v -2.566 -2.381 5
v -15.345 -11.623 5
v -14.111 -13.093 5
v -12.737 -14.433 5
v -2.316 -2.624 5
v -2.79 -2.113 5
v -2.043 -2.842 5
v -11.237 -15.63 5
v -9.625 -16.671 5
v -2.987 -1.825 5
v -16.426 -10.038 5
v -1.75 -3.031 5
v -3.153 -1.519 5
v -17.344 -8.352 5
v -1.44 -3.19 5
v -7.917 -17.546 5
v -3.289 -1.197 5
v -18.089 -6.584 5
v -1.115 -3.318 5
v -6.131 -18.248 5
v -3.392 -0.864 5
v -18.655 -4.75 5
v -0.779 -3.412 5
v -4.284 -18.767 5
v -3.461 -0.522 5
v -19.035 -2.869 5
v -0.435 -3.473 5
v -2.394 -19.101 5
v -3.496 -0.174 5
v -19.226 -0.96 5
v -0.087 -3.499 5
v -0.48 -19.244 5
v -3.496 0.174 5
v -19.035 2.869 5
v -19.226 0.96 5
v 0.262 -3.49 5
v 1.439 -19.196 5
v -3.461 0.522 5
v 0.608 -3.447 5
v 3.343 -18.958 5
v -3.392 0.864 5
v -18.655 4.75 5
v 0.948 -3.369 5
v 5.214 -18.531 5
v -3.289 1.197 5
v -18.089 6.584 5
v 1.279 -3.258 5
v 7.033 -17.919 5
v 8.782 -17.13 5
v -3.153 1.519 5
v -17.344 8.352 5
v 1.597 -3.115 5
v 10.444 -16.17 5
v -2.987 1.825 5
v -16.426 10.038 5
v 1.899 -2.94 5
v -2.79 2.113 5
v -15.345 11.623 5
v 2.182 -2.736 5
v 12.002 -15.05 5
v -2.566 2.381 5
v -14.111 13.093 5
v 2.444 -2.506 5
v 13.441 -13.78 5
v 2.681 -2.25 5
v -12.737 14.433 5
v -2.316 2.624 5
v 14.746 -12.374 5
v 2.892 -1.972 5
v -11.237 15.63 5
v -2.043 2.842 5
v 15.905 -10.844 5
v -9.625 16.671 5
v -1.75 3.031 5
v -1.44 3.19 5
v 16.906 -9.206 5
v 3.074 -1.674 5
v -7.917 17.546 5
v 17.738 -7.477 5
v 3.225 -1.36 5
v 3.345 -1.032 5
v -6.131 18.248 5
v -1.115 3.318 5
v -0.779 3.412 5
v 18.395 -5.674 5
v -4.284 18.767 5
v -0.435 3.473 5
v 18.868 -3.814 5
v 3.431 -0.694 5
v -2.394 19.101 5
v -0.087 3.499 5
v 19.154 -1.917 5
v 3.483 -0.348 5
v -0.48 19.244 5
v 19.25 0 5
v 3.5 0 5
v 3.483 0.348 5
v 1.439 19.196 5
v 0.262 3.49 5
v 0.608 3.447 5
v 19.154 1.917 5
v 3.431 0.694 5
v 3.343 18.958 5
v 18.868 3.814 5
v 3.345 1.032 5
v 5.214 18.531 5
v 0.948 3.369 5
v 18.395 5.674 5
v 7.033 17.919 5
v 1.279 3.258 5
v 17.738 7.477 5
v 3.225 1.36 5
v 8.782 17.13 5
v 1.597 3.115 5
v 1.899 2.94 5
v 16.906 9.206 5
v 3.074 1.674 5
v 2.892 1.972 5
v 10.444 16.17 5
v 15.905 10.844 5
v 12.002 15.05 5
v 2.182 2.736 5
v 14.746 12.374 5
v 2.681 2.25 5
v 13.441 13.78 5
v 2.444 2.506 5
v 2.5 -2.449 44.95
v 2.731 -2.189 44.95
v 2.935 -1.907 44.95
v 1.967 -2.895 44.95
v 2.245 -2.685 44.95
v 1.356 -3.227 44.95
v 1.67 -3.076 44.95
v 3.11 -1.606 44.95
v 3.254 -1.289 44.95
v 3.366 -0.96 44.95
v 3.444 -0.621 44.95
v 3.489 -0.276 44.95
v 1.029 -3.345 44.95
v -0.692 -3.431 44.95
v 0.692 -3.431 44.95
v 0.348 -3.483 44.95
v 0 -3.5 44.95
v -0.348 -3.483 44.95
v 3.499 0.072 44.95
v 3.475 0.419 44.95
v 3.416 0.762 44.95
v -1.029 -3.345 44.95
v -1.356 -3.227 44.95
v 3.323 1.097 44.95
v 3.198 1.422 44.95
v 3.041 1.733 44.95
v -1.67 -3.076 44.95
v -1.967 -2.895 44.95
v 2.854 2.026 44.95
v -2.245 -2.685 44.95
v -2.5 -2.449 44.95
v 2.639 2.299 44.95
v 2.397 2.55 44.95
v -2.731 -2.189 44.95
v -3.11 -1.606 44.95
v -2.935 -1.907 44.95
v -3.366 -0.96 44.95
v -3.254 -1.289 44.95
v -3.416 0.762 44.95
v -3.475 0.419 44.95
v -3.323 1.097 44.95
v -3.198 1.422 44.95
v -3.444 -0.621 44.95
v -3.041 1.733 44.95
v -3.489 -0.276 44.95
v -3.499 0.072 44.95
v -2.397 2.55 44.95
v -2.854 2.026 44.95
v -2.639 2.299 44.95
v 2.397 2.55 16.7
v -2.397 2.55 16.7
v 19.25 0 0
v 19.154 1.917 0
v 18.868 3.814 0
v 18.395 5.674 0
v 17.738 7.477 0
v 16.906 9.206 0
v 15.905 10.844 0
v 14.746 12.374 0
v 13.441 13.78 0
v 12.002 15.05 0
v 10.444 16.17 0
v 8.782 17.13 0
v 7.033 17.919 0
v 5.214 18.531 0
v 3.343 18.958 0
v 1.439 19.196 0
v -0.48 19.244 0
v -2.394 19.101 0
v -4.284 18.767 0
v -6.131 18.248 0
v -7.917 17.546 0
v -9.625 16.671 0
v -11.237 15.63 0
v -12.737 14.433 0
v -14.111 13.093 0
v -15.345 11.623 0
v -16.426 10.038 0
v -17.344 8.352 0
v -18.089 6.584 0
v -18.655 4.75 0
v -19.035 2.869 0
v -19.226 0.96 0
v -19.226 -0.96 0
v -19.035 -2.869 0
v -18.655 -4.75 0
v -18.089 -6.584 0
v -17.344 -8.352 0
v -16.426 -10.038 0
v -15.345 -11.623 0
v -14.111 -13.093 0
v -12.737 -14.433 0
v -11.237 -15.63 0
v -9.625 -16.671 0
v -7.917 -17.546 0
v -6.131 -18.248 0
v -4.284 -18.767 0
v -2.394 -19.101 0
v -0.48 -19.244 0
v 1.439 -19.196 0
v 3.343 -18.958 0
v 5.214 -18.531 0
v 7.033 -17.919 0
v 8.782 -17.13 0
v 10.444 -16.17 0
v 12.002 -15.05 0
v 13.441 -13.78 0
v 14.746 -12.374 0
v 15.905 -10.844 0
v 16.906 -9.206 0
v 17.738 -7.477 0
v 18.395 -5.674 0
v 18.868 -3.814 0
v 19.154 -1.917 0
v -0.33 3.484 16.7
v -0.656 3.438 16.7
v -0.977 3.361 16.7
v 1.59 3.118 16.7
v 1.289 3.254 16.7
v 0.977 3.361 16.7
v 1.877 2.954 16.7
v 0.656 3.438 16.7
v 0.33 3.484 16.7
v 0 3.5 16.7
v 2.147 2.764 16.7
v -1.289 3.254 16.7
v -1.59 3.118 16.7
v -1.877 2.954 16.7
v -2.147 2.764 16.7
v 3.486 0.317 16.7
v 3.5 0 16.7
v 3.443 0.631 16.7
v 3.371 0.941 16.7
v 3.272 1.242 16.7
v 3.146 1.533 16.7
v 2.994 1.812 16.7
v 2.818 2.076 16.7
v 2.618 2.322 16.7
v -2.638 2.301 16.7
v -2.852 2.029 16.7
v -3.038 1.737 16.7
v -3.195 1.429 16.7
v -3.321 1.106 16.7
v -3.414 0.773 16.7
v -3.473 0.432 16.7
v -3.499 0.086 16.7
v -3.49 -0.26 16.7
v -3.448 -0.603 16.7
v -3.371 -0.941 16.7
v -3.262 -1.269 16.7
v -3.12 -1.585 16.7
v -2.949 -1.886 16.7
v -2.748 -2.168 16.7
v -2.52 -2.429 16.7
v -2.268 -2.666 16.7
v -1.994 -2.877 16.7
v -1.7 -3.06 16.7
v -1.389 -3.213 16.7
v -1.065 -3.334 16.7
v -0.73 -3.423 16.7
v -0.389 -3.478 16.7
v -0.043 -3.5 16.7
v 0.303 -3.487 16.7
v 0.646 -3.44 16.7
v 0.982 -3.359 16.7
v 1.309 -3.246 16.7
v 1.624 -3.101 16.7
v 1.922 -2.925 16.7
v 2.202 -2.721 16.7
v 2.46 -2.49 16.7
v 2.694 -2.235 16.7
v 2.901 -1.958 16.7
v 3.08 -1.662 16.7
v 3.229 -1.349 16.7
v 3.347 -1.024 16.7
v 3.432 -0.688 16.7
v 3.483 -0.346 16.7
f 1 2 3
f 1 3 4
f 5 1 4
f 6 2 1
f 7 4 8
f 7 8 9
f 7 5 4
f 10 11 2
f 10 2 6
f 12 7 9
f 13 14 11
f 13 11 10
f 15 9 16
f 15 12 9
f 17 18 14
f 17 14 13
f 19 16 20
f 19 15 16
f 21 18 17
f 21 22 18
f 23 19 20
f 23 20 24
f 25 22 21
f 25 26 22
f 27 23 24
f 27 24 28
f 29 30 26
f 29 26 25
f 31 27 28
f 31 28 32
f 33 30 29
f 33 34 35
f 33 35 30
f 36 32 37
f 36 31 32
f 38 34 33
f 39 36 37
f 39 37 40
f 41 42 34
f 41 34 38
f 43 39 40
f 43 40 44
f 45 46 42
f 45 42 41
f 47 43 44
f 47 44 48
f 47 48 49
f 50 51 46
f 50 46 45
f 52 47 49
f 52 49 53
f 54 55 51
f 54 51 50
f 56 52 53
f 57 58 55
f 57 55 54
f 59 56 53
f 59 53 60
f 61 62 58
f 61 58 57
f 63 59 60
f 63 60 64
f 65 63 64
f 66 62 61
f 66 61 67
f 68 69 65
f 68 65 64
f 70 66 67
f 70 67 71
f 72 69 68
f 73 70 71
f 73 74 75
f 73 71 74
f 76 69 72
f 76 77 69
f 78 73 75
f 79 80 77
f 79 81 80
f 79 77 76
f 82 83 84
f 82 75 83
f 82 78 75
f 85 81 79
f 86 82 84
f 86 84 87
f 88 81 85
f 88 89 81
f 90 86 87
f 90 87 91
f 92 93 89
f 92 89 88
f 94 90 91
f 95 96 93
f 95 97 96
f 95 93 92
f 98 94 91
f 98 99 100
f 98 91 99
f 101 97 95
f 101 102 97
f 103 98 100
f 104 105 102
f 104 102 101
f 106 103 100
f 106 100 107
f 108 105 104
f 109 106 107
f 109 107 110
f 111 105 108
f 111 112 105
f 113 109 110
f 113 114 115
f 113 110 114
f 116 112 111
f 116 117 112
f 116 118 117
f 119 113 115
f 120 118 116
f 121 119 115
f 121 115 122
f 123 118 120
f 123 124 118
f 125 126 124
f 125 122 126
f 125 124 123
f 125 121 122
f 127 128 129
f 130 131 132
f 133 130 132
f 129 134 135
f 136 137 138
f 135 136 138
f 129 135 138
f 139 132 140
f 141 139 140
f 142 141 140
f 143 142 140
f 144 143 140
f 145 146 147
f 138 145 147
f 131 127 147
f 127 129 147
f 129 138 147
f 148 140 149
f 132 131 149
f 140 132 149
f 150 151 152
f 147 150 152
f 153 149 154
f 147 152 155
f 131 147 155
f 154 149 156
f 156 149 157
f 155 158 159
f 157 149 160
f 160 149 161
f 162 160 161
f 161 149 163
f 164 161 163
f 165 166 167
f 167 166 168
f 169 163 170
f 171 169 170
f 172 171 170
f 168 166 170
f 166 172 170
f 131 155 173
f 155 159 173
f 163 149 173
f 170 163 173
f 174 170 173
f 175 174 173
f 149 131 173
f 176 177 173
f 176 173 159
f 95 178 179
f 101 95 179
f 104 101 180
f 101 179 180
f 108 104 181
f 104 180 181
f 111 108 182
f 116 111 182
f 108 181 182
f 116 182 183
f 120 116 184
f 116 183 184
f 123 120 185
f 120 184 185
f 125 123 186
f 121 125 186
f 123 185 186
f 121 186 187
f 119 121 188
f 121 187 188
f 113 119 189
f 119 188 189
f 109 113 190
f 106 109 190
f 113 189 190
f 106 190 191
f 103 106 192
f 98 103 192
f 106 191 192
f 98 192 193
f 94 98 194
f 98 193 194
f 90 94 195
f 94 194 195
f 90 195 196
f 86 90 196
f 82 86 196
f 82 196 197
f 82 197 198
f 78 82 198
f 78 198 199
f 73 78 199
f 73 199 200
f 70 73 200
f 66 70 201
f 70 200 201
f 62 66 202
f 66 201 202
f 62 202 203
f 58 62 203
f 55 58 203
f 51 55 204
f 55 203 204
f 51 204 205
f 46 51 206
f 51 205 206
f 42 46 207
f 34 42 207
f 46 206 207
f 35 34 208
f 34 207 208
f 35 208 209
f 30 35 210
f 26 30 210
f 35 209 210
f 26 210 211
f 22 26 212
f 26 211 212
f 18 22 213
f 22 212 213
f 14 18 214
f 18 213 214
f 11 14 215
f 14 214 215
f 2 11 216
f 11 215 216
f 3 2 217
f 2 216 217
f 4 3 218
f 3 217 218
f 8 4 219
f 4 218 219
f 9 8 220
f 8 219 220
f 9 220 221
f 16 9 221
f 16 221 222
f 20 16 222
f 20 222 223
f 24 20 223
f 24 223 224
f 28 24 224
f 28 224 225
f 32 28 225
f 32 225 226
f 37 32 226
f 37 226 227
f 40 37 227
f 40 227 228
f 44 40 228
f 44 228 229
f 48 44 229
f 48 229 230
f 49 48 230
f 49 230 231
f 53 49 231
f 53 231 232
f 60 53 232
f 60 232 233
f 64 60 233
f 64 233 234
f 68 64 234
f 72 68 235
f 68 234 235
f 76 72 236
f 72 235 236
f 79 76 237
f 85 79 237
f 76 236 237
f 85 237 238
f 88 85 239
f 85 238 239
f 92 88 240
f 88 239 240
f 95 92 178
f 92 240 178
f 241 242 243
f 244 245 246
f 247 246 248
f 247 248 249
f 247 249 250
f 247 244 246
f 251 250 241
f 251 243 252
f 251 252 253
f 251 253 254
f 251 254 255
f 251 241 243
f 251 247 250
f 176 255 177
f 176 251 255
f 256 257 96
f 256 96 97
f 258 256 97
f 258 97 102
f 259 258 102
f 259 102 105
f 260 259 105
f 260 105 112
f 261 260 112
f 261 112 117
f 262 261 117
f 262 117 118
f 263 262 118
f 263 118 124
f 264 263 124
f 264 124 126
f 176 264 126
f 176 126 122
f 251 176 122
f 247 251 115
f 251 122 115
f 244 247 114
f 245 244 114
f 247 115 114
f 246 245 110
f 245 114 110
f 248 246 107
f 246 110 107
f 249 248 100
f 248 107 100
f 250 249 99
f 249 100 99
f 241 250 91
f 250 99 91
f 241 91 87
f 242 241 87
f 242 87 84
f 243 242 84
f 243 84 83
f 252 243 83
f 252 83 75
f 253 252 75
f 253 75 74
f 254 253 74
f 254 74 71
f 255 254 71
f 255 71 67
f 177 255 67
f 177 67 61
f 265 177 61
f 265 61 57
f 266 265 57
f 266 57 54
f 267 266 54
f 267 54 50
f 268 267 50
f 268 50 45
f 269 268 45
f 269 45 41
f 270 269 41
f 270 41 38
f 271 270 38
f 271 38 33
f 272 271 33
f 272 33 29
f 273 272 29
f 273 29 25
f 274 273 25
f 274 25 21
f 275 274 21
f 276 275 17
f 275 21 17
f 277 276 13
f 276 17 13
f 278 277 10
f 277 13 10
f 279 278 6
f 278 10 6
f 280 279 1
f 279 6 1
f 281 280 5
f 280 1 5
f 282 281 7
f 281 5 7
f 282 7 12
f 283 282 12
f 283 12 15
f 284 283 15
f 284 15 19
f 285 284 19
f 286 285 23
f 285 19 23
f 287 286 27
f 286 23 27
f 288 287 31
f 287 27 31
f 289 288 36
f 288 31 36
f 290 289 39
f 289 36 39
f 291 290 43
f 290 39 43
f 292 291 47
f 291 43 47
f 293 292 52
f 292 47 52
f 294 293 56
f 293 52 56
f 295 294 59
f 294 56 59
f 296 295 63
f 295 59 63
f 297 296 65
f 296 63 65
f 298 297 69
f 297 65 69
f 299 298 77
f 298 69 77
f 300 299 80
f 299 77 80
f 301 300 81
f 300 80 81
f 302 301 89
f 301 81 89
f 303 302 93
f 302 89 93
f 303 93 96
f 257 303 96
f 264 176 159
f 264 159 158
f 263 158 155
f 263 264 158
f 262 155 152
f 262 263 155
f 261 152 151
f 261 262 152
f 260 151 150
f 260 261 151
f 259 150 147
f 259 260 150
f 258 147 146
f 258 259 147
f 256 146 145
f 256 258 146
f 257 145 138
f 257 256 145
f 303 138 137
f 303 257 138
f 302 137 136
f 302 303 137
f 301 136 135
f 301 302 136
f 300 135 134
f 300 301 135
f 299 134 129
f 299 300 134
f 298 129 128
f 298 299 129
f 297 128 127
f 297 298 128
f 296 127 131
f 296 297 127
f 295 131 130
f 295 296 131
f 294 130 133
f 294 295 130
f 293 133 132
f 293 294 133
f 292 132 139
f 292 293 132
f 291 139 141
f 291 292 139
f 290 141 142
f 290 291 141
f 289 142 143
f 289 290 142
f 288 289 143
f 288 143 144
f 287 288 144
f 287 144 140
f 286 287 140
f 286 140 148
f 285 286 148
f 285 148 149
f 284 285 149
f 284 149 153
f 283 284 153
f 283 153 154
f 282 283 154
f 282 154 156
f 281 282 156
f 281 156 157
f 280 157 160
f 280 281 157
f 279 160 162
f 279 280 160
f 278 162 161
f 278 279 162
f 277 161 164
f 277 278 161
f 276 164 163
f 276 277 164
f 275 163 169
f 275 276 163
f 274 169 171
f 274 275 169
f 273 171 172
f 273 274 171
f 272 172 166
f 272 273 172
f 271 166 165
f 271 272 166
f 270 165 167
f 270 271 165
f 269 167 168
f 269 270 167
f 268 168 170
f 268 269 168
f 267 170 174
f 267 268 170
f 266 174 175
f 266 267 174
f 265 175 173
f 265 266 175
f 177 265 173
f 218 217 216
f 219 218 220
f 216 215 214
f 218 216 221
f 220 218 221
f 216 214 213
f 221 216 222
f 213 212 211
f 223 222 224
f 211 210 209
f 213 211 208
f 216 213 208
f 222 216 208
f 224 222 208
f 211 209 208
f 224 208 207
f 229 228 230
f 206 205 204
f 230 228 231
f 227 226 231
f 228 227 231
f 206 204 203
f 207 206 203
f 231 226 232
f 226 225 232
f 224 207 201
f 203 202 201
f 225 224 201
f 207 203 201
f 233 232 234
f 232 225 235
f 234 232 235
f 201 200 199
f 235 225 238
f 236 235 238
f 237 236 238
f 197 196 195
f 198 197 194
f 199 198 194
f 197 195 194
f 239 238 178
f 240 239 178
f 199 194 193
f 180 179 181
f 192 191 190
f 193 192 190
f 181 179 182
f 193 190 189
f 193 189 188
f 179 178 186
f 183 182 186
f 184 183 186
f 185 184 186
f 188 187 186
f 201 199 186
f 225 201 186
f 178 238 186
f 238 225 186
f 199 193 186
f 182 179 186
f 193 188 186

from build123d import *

# Parameters (mm, degrees)
CROQUIS1_R              = 19.25
SALIENTE_EXTRUIR1_DEPTH = 5
CROQUIS2_R              = 3.5
SALIENTE_EXTRUIR2_DEPTH = 11.7
SALIENTE_EXTRUIR3_DEPTH = 28.25


with BuildPart() as part:
    # Croquis1 → Saliente-Extruir1 (new body)
    with BuildSketch(Plane.XY):
        Circle(CROQUIS1_R)
    extrude(amount=SALIENTE_EXTRUIR1_DEPTH)

    # Croquis2 → Saliente-Extruir2 (add)
    with BuildSketch(Plane.XY.offset(5)):
        Circle(CROQUIS2_R)
    extrude(amount=SALIENTE_EXTRUIR2_DEPTH)

    # Croquis3 → Saliente-Extruir3 (add)
    with BuildSketch(Plane.XY.offset(16.7)):
        with BuildLine():
            Line((-2.397394419, 2.55), (2.397394419, 2.55))
            ThreePointArc((2.397394419, 2.55), (0, -3.5), (-2.397394419, 2.55))
        make_face()
    extrude(amount=SALIENTE_EXTRUIR3_DEPTH)


solid = part.part
